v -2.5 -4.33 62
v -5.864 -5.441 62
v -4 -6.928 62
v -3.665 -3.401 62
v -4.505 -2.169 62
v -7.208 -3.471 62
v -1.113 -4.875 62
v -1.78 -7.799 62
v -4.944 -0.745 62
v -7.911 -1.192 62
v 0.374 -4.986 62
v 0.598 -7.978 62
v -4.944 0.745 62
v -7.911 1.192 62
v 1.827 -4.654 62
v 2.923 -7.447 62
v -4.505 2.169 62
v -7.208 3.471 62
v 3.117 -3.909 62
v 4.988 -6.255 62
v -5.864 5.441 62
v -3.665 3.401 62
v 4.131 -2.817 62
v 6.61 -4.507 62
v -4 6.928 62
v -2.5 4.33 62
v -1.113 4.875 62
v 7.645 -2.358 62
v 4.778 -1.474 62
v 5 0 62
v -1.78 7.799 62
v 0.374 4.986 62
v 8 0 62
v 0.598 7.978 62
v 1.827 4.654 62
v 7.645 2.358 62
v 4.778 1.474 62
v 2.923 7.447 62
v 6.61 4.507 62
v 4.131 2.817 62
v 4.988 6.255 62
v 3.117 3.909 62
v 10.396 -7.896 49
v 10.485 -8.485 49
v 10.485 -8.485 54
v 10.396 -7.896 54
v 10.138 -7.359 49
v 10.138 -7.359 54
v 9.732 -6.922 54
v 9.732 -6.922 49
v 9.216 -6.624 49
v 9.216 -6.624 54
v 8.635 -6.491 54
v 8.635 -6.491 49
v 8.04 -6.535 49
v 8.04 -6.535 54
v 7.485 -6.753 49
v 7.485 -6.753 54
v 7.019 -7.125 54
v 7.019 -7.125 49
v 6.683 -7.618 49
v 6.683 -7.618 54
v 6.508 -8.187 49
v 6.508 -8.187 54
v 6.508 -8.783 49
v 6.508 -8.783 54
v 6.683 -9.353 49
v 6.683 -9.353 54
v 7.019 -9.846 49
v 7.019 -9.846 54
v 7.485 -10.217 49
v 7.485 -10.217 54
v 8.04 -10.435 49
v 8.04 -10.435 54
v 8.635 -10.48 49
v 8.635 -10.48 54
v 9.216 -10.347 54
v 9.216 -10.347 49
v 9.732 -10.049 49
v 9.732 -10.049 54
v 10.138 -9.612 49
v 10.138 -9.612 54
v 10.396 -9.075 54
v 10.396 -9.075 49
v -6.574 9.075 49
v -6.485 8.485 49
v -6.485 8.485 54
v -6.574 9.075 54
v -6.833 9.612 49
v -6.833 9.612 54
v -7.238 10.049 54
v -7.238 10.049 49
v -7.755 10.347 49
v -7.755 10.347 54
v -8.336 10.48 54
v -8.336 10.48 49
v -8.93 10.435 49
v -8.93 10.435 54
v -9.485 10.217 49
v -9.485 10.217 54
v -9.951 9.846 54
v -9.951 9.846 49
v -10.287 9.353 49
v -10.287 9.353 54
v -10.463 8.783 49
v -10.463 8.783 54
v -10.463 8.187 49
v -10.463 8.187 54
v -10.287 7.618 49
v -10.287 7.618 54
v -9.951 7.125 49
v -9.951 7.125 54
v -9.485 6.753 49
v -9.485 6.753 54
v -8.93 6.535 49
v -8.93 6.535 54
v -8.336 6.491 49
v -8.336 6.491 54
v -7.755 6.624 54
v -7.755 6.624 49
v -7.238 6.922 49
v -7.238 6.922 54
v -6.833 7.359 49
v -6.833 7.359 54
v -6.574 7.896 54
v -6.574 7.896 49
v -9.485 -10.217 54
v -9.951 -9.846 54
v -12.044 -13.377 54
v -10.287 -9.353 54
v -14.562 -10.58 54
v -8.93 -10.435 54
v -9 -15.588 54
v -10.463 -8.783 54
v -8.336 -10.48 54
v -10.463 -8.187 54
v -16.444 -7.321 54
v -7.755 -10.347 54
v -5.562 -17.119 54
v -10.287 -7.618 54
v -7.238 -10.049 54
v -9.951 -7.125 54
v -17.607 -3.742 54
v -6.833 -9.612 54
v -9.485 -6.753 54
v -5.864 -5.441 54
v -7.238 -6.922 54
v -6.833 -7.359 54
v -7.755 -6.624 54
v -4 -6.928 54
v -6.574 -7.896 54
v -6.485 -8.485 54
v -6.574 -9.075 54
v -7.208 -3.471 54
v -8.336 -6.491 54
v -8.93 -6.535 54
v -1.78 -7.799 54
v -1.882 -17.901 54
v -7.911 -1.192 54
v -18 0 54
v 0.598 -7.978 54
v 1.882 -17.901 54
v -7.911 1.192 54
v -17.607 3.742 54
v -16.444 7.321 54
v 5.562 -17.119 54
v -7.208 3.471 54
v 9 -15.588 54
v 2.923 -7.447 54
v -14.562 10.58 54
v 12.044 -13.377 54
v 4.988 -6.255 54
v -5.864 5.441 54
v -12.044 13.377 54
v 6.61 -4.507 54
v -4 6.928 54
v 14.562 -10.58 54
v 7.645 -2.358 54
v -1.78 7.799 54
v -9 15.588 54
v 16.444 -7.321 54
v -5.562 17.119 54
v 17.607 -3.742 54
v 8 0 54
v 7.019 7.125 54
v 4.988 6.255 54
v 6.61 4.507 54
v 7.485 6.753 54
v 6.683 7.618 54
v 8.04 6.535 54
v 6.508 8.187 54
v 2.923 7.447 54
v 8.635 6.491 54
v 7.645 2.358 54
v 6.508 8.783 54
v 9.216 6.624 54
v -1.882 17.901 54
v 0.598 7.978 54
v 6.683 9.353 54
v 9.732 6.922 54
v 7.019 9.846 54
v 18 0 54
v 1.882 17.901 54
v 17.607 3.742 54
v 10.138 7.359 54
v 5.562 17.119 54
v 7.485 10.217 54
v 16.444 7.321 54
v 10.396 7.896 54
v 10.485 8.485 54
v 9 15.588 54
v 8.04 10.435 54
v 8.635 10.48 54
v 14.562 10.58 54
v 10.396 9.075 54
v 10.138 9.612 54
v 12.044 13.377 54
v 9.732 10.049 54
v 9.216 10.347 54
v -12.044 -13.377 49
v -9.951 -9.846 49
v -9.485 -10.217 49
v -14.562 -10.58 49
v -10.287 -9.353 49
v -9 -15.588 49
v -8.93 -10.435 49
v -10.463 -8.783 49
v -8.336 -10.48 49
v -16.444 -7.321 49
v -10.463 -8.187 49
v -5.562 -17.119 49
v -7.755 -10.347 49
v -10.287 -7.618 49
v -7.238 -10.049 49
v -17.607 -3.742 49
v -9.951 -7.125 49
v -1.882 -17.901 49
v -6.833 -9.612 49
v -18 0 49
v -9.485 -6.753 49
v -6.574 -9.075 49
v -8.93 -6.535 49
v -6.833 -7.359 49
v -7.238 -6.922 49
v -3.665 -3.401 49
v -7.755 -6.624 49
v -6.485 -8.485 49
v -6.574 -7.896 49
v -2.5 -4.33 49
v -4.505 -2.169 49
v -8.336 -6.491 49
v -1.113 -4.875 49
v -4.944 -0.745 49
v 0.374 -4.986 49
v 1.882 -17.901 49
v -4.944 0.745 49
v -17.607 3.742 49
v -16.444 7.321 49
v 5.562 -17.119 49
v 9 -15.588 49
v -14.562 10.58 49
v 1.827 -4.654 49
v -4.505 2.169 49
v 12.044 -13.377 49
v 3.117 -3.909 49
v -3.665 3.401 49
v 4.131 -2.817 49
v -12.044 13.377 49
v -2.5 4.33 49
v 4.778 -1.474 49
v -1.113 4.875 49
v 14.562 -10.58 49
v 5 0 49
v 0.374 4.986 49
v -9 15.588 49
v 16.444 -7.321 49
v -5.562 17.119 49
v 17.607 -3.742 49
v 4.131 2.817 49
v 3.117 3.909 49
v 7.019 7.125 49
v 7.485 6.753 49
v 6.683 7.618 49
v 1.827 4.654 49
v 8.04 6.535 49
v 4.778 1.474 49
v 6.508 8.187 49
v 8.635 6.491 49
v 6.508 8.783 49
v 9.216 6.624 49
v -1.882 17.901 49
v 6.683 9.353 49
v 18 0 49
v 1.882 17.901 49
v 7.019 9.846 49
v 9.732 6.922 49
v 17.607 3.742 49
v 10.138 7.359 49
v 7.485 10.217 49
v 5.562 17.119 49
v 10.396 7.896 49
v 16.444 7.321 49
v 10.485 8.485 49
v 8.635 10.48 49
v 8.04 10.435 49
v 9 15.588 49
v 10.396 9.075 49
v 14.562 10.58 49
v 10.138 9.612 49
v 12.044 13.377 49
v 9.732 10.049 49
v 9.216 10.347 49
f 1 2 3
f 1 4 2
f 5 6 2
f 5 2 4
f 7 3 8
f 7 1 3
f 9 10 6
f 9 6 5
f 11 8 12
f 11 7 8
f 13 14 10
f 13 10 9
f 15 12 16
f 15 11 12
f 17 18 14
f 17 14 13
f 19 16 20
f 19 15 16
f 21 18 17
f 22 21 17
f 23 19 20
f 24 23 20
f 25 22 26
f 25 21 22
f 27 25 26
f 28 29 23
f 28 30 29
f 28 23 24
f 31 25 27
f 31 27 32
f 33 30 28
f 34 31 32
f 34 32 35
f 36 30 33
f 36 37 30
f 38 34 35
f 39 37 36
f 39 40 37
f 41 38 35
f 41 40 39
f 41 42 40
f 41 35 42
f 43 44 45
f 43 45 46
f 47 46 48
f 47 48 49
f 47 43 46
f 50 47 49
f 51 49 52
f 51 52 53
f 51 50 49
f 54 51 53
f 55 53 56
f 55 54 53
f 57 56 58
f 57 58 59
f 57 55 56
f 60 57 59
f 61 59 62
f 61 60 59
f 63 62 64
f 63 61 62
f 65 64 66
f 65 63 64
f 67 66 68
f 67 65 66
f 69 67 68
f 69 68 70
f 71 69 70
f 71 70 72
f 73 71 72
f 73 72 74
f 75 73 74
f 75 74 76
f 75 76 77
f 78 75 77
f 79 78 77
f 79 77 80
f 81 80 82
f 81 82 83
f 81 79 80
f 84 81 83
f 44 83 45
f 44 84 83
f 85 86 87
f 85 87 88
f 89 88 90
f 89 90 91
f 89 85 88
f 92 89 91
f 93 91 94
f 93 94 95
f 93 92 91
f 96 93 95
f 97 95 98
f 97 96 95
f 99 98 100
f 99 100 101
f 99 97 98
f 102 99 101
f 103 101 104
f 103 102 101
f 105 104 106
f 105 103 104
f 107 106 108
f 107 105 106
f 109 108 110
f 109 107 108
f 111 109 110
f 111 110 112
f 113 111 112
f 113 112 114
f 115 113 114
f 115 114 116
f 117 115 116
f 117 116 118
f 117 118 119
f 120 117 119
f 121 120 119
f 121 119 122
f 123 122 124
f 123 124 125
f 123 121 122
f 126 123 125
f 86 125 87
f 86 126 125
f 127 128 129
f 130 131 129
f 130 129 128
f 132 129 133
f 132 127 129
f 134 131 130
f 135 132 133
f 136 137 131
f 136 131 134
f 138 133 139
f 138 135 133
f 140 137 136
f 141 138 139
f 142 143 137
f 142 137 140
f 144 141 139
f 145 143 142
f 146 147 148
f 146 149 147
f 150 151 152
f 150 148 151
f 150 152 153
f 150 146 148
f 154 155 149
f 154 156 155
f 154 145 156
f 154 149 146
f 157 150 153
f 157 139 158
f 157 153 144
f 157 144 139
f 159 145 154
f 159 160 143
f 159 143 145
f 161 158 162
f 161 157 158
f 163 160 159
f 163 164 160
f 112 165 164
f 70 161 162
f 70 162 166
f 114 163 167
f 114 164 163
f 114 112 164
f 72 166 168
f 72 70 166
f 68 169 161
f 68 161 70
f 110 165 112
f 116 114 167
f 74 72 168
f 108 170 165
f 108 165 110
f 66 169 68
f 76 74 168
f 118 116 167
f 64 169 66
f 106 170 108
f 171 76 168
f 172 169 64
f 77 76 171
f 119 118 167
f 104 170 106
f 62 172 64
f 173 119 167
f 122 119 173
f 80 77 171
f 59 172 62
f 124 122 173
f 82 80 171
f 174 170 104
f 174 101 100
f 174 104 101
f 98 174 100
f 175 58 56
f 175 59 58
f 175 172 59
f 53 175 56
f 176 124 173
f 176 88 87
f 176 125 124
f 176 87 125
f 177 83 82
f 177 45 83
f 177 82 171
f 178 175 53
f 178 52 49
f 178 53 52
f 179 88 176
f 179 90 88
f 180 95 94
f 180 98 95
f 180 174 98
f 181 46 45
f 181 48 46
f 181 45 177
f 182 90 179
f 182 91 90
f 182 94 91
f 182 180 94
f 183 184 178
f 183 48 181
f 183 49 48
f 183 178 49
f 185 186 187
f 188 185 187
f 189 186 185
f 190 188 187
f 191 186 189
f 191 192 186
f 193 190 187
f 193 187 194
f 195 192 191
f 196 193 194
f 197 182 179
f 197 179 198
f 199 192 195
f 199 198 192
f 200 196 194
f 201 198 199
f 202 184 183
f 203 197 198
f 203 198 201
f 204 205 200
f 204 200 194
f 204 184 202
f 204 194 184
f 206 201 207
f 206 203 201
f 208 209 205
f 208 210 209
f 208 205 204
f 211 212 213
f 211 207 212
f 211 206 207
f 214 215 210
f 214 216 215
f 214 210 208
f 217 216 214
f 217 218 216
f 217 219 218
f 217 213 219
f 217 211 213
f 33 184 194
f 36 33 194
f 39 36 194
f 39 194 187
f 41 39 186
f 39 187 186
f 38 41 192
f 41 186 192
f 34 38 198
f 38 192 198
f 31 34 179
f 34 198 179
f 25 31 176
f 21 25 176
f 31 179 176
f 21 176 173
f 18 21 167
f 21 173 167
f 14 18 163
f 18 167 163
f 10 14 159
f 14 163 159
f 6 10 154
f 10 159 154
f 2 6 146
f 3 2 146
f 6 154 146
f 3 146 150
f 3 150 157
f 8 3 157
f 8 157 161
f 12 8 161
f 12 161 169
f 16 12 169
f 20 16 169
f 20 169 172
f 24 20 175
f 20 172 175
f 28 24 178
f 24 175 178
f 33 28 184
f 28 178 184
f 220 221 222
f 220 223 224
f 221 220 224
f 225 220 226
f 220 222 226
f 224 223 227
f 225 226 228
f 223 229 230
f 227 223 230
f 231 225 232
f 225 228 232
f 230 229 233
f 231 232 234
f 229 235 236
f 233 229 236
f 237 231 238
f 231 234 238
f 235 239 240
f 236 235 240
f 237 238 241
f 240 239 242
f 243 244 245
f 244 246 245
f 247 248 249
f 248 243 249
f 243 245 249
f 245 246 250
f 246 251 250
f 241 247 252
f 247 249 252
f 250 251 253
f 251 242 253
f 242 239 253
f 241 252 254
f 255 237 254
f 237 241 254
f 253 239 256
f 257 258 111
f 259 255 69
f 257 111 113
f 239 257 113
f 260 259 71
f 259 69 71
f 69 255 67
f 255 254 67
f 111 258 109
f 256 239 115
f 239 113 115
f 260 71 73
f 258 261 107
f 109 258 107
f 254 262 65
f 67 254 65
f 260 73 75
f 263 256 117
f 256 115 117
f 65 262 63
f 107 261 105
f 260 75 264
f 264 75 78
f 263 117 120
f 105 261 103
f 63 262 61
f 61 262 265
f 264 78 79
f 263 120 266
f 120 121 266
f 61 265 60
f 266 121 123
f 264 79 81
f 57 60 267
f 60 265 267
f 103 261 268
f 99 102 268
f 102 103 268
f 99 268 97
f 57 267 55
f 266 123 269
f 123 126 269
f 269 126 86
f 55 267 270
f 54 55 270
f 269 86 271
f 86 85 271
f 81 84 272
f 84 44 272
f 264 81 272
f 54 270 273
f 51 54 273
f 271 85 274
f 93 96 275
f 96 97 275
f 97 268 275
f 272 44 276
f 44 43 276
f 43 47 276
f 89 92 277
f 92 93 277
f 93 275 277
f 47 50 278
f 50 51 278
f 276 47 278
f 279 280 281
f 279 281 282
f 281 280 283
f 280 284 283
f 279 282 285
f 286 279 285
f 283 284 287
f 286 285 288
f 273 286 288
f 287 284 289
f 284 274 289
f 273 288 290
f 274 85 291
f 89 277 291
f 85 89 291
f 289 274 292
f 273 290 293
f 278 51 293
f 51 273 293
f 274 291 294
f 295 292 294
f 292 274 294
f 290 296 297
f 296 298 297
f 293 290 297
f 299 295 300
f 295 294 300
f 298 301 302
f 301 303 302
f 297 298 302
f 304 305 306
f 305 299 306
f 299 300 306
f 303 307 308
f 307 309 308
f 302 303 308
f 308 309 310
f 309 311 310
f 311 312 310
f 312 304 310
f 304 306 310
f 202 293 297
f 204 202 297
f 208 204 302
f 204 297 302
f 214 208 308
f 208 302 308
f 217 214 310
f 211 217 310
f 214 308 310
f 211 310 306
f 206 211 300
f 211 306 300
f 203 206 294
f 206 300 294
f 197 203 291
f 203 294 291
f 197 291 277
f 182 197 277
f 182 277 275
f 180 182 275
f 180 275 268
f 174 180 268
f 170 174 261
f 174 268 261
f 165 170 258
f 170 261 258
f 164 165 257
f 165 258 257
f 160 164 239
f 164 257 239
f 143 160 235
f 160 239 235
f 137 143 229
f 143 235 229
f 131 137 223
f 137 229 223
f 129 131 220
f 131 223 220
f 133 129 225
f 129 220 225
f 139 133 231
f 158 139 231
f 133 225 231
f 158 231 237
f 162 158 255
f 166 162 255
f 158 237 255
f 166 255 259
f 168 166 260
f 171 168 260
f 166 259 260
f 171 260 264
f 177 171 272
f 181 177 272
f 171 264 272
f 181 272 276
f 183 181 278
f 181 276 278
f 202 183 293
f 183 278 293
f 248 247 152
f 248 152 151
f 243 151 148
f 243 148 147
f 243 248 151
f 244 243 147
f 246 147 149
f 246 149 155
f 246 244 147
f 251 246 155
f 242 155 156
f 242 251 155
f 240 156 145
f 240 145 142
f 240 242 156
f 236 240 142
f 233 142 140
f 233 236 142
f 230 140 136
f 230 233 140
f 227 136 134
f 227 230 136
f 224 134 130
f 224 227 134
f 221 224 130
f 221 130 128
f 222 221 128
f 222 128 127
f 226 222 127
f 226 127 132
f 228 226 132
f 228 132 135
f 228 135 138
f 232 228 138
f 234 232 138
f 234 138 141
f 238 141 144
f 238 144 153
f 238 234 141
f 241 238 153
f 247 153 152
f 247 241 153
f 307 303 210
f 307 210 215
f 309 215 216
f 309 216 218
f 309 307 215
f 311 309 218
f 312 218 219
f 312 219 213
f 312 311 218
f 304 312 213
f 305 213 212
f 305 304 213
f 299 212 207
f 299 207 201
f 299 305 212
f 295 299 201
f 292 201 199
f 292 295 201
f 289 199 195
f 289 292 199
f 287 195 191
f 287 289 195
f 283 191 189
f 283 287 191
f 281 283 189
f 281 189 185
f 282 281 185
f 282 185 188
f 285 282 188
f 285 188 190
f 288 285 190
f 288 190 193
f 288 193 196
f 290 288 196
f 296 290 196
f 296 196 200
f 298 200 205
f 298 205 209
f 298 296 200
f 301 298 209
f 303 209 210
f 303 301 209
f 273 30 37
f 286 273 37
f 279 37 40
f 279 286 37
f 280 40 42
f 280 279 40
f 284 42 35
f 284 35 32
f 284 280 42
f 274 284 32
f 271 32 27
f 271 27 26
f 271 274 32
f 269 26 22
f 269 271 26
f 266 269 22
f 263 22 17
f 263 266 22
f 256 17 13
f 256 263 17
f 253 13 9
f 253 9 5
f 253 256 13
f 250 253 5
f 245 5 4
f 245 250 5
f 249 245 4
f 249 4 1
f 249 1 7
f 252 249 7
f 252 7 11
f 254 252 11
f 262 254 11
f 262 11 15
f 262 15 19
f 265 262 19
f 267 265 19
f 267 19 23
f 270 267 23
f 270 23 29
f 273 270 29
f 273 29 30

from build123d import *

# Parameters (mm, degrees)
SKETCH010_R      = 18
SKETCH010_R_2    = 5
SKETCH010_R_3    = 2
EXTRUDE010_DEPTH = 5
SKETCH011_R      = 8
SKETCH011_R_2    = 5
EXTRUDE011_DEPTH = 8


with BuildPart() as extrude010:
    # Sketch010 (on Face29 of Cut003) → Extrude010 (new body)
    with BuildSketch(Plane.XY.offset(49)):
        Circle(SKETCH010_R)
        Circle(SKETCH010_R_2, mode=Mode.SUBTRACT)
        with Locations((8.485281, 8.485281)):
            Circle(SKETCH010_R_3, mode=Mode.SUBTRACT)
        with Locations((8.485281, -8.485281)):
            Circle(SKETCH010_R_3, mode=Mode.SUBTRACT)
        with Locations((-8.485281, -8.485281)):
            Circle(SKETCH010_R_3, mode=Mode.SUBTRACT)
        with Locations((-8.485281, 8.485281)):
            Circle(SKETCH010_R_3, mode=Mode.SUBTRACT)
    extrude(amount=EXTRUDE010_DEPTH)


with BuildPart() as flangemockup:
    # Sketch011 (on Face8 of Extrude010) → Extrude011 (new body)
    with BuildSketch(Plane.XY.offset(54)):
        Circle(SKETCH011_R)
        Circle(SKETCH011_R_2, mode=Mode.SUBTRACT)
    extrude(amount=EXTRUDE011_DEPTH)

    # Fusion002: union Extrude010
    add(extrude010.part)


solid = flangemockup.part
